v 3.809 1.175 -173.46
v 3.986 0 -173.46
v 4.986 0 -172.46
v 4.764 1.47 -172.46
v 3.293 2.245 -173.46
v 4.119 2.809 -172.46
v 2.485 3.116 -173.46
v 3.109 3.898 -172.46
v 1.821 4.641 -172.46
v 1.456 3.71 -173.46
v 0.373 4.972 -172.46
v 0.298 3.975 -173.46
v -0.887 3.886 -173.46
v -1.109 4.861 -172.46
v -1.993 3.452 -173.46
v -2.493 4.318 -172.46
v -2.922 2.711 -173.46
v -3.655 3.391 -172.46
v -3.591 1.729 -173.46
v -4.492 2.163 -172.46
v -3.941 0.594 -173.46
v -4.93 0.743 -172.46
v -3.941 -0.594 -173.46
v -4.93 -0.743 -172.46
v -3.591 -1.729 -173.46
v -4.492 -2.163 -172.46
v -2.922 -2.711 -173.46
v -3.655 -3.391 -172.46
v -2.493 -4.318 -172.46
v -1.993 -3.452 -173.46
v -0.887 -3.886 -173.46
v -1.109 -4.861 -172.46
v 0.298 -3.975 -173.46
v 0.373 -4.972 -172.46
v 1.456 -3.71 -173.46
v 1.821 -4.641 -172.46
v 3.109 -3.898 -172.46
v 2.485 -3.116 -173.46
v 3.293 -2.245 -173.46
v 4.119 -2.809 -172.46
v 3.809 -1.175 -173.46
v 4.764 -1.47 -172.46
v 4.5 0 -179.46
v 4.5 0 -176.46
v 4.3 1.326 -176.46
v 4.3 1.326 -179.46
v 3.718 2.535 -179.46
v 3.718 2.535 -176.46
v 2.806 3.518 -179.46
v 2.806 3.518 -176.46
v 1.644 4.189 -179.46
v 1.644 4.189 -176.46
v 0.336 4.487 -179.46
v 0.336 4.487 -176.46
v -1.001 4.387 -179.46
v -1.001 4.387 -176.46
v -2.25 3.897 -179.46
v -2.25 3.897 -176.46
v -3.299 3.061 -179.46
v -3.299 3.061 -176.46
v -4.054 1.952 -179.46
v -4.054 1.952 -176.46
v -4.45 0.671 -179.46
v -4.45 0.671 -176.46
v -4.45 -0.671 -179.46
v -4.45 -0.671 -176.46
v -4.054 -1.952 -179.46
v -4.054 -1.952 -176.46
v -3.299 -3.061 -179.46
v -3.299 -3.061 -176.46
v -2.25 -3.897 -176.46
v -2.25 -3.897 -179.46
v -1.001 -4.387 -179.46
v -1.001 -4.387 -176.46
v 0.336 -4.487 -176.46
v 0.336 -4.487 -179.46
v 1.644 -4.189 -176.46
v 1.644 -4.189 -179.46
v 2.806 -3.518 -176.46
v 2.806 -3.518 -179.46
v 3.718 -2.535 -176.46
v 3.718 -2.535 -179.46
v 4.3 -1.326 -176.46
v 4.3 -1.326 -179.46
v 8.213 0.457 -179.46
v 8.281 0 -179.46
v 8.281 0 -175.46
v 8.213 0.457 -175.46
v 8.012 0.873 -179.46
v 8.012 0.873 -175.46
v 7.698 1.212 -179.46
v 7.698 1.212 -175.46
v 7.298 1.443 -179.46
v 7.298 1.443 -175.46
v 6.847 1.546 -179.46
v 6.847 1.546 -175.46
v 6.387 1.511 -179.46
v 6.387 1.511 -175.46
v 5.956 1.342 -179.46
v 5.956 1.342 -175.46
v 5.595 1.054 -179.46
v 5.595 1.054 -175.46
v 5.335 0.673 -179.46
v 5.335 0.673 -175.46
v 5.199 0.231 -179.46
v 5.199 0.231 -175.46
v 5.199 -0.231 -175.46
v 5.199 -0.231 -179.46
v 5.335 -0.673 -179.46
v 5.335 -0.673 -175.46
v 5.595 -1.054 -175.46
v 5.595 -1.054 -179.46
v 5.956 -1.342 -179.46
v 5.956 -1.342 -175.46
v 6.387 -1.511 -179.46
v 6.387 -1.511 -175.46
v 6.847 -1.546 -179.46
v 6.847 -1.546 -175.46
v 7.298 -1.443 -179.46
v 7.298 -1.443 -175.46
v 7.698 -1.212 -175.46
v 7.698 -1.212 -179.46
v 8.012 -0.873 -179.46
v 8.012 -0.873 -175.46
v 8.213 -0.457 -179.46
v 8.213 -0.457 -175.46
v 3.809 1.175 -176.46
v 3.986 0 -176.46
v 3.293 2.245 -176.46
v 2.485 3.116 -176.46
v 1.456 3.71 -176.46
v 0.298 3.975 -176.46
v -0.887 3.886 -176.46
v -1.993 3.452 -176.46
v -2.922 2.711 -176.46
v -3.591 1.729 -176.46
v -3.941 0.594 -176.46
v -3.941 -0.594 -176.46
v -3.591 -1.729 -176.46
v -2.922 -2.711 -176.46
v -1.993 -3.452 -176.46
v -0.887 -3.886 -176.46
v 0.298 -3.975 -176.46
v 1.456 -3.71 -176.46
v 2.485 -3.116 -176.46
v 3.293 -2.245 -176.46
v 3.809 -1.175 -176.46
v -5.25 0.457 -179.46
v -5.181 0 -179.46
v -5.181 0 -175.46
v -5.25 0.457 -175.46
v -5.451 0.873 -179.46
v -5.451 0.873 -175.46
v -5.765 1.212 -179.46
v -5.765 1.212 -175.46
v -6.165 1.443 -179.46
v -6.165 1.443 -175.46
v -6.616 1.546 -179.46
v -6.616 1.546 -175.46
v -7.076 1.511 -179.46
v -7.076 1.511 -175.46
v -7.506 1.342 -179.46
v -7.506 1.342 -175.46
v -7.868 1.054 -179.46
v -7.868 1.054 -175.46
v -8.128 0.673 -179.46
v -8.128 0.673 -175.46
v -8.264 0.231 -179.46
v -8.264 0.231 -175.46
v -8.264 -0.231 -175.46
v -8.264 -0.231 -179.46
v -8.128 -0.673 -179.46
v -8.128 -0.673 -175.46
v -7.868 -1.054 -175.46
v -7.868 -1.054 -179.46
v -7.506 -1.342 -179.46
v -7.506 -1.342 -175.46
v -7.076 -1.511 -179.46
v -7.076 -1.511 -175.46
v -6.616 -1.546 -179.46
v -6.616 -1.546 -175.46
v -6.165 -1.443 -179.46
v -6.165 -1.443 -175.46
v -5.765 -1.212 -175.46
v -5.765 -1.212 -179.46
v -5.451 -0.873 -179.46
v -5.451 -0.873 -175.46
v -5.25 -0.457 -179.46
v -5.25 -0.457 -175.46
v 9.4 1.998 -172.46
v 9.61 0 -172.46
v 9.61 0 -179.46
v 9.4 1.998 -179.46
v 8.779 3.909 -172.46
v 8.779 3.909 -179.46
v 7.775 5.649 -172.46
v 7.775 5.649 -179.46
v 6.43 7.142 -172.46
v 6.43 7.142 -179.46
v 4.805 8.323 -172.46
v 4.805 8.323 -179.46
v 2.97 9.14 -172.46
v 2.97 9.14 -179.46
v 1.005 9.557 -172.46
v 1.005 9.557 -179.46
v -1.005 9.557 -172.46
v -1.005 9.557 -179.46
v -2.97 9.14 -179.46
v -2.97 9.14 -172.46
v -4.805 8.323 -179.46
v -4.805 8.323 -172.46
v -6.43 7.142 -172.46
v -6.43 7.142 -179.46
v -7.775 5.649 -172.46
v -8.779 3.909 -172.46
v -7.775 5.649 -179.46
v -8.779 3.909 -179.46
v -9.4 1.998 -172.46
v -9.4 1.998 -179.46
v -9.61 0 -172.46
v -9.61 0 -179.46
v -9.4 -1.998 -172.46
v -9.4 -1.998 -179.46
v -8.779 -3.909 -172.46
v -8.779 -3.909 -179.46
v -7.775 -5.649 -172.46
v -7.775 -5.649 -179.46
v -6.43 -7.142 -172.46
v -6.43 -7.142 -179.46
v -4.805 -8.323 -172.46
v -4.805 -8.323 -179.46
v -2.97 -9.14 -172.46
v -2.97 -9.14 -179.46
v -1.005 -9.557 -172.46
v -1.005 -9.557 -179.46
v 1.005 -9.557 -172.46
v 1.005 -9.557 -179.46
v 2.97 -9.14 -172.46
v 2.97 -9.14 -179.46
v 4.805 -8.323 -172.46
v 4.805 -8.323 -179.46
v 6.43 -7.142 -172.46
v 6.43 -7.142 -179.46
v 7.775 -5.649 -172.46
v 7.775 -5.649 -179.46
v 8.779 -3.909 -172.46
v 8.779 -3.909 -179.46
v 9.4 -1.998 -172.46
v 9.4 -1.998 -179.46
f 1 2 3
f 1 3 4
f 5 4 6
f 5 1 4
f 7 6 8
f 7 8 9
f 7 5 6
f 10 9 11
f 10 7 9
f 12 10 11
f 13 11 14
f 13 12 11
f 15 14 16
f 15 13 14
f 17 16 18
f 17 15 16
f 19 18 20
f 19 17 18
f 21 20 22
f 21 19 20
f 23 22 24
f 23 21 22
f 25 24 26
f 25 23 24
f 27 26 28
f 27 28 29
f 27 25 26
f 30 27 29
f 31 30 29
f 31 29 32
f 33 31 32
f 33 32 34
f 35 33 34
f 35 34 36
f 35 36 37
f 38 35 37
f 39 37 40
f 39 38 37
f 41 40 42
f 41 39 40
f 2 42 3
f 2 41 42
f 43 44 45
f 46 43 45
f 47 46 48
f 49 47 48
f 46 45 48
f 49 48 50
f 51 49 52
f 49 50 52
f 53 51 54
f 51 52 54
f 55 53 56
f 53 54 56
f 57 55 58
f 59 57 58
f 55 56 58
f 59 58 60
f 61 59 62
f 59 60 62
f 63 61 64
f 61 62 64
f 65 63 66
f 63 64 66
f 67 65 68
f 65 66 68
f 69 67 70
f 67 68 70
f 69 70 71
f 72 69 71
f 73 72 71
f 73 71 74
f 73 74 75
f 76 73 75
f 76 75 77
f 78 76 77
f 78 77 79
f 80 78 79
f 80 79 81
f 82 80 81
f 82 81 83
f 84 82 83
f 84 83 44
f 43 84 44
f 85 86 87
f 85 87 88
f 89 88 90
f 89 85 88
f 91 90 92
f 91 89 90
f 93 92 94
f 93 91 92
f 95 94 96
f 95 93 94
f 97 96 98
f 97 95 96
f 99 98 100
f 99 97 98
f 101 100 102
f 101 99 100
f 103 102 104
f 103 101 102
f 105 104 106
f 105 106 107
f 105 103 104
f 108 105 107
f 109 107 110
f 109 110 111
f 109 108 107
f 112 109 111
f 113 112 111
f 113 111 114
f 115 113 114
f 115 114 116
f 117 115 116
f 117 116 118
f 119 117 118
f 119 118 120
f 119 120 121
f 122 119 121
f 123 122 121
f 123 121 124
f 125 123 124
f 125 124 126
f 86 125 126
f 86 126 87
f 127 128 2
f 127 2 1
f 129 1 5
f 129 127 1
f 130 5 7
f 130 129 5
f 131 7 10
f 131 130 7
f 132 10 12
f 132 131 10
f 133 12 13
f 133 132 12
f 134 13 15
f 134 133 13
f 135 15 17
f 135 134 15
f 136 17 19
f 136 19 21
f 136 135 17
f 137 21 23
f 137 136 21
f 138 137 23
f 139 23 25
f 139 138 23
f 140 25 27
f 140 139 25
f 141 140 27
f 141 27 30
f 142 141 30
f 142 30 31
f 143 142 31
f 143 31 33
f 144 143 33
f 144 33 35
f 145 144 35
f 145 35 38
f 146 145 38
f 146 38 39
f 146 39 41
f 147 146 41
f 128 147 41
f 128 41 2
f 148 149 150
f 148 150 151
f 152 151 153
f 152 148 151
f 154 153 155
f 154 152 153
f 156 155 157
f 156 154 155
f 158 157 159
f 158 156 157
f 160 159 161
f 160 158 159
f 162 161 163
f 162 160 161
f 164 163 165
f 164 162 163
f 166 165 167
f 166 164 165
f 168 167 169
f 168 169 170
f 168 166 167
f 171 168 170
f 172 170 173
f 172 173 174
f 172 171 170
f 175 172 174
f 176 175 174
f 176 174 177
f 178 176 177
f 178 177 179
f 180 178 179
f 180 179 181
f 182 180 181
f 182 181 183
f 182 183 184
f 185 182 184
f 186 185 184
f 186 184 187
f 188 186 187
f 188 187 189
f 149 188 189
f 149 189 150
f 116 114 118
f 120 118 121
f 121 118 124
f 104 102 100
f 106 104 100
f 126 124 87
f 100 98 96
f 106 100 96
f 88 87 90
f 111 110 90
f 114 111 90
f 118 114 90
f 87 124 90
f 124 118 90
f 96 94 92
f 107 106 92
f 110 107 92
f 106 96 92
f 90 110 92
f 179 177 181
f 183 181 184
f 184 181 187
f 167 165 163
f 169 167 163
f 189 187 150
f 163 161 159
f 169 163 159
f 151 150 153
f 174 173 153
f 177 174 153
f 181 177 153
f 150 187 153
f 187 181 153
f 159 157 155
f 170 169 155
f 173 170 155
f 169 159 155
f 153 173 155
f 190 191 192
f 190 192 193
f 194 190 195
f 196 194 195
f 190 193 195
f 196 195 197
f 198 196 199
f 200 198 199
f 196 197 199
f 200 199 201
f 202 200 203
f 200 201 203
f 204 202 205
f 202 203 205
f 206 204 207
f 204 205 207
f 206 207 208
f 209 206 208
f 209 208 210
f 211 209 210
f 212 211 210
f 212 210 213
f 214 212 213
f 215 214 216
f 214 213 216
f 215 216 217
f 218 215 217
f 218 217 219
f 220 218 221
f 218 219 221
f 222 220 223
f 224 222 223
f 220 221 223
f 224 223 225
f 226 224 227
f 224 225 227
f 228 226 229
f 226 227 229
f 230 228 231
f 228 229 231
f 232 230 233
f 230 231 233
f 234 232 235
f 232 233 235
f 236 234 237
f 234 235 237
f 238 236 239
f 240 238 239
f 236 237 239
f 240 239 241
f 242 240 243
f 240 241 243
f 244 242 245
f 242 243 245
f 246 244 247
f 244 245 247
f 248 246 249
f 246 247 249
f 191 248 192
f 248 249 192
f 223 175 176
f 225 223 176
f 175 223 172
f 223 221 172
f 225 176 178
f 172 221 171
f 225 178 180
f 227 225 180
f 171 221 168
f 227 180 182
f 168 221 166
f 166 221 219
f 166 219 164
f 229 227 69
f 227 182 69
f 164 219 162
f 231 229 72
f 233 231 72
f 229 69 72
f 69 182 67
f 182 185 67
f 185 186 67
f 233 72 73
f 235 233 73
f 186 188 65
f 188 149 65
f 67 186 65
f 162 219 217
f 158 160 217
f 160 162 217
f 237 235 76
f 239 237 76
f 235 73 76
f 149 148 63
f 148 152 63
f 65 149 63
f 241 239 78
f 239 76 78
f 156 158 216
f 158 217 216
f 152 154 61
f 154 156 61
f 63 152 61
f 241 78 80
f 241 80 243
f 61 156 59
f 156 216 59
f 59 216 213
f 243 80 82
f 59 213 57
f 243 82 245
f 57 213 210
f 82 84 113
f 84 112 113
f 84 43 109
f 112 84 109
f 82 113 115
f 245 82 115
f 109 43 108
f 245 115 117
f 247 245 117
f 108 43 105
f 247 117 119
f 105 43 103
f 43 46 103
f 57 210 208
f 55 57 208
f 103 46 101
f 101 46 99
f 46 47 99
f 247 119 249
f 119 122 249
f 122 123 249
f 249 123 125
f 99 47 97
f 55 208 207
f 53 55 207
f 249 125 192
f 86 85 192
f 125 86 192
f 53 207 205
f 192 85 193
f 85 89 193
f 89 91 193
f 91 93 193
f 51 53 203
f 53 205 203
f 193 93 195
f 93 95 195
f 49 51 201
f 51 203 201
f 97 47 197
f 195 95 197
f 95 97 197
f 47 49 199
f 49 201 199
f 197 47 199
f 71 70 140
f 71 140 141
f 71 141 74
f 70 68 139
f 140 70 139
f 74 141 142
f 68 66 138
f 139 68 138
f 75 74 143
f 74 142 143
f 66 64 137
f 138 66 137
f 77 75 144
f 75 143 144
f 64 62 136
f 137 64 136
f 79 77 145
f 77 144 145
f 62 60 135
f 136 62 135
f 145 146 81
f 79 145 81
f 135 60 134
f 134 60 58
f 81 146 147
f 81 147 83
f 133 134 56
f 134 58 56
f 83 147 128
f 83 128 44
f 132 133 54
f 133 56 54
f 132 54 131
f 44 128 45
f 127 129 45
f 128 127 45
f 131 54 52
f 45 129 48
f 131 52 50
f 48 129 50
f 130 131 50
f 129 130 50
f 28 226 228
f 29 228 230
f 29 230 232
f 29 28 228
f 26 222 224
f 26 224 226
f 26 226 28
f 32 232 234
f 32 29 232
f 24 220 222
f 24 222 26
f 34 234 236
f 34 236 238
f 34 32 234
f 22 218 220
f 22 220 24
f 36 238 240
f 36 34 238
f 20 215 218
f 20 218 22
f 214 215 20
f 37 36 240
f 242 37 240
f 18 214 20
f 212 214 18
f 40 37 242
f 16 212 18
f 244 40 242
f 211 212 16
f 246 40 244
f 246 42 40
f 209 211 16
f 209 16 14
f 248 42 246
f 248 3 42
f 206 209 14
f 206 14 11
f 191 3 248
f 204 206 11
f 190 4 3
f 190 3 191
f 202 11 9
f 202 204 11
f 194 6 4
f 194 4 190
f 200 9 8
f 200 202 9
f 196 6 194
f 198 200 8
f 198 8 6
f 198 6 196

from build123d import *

# Parameters (mm, degrees)
SKETCH2_R               = 9.61
SKETCH2_R_2             = 3.985714286
SKETCH2_R_3             = 1.55
BOSS_EXTRUDE2_DEPTH     = 7
SKETCH3_R               = 4.5
BOSS_EXTRUDE3_DEPTH     = 3
SKETCH4_R               = 4.5
CUT_EXTRUDE1_DEPTH      = 6
CHAMFER3_SIZE           = 1
BOSS_EXTRUDE4_START     = -3
BOSS_EXTRUDE4_OUTLINE_R = 1.55
BOSS_EXTRUDE4_DEPTH     = 3


# Read off the part's stored shape, not the designer's step: Boss-Extrude4
with BuildPart() as part:
    # Sketch2 → Boss-Extrude2 (new body)
    with BuildSketch(Plane.XY.offset(-179.459781676)):
        Circle(SKETCH2_R)
        Circle(SKETCH2_R_2, mode=Mode.SUBTRACT)
        with Locations((6.731428571, 0)):
            Circle(SKETCH2_R_3, mode=Mode.SUBTRACT)
        with Locations((-6.731428571, 0)):
            Circle(SKETCH2_R_3, mode=Mode.SUBTRACT)
    extrude(amount=BOSS_EXTRUDE2_DEPTH)

    # Sketch3 → Boss-Extrude3 (add)
    with BuildSketch(Plane(origin=(0, 0, -179.459781676), x_dir=(-1, 0, 0), z_dir=(0, 0, -1))):
        Circle(SKETCH3_R)
    extrude(amount=-BOSS_EXTRUDE3_DEPTH)

    # Sketch4 → Cut-Extrude1 (cut)
    with BuildSketch(Plane.XY.offset(-176.459781676)):
        Circle(SKETCH4_R)
    extrude(amount=-CUT_EXTRUDE1_DEPTH, mode=Mode.SUBTRACT)

    # Chamfer3
    chamfer3_edges = [part.edges().sort_by_distance(p)[0] for p in [
        (-3.985714286, 0, -172.459781676),
    ]]
    chamfer(chamfer3_edges, length=CHAMFER3_SIZE)

    # Boss-Extrude4 outline → Boss-Extrude4 (add)
    with BuildSketch(Plane.XY.offset(-172.459781676).offset(BOSS_EXTRUDE4_START)):
        with Locations((6.731428571, 0)):
            Circle(BOSS_EXTRUDE4_OUTLINE_R)
        with Locations((-6.731428571, 0)):
            Circle(BOSS_EXTRUDE4_OUTLINE_R)
    extrude(amount=BOSS_EXTRUDE4_DEPTH)


solid = part.part
